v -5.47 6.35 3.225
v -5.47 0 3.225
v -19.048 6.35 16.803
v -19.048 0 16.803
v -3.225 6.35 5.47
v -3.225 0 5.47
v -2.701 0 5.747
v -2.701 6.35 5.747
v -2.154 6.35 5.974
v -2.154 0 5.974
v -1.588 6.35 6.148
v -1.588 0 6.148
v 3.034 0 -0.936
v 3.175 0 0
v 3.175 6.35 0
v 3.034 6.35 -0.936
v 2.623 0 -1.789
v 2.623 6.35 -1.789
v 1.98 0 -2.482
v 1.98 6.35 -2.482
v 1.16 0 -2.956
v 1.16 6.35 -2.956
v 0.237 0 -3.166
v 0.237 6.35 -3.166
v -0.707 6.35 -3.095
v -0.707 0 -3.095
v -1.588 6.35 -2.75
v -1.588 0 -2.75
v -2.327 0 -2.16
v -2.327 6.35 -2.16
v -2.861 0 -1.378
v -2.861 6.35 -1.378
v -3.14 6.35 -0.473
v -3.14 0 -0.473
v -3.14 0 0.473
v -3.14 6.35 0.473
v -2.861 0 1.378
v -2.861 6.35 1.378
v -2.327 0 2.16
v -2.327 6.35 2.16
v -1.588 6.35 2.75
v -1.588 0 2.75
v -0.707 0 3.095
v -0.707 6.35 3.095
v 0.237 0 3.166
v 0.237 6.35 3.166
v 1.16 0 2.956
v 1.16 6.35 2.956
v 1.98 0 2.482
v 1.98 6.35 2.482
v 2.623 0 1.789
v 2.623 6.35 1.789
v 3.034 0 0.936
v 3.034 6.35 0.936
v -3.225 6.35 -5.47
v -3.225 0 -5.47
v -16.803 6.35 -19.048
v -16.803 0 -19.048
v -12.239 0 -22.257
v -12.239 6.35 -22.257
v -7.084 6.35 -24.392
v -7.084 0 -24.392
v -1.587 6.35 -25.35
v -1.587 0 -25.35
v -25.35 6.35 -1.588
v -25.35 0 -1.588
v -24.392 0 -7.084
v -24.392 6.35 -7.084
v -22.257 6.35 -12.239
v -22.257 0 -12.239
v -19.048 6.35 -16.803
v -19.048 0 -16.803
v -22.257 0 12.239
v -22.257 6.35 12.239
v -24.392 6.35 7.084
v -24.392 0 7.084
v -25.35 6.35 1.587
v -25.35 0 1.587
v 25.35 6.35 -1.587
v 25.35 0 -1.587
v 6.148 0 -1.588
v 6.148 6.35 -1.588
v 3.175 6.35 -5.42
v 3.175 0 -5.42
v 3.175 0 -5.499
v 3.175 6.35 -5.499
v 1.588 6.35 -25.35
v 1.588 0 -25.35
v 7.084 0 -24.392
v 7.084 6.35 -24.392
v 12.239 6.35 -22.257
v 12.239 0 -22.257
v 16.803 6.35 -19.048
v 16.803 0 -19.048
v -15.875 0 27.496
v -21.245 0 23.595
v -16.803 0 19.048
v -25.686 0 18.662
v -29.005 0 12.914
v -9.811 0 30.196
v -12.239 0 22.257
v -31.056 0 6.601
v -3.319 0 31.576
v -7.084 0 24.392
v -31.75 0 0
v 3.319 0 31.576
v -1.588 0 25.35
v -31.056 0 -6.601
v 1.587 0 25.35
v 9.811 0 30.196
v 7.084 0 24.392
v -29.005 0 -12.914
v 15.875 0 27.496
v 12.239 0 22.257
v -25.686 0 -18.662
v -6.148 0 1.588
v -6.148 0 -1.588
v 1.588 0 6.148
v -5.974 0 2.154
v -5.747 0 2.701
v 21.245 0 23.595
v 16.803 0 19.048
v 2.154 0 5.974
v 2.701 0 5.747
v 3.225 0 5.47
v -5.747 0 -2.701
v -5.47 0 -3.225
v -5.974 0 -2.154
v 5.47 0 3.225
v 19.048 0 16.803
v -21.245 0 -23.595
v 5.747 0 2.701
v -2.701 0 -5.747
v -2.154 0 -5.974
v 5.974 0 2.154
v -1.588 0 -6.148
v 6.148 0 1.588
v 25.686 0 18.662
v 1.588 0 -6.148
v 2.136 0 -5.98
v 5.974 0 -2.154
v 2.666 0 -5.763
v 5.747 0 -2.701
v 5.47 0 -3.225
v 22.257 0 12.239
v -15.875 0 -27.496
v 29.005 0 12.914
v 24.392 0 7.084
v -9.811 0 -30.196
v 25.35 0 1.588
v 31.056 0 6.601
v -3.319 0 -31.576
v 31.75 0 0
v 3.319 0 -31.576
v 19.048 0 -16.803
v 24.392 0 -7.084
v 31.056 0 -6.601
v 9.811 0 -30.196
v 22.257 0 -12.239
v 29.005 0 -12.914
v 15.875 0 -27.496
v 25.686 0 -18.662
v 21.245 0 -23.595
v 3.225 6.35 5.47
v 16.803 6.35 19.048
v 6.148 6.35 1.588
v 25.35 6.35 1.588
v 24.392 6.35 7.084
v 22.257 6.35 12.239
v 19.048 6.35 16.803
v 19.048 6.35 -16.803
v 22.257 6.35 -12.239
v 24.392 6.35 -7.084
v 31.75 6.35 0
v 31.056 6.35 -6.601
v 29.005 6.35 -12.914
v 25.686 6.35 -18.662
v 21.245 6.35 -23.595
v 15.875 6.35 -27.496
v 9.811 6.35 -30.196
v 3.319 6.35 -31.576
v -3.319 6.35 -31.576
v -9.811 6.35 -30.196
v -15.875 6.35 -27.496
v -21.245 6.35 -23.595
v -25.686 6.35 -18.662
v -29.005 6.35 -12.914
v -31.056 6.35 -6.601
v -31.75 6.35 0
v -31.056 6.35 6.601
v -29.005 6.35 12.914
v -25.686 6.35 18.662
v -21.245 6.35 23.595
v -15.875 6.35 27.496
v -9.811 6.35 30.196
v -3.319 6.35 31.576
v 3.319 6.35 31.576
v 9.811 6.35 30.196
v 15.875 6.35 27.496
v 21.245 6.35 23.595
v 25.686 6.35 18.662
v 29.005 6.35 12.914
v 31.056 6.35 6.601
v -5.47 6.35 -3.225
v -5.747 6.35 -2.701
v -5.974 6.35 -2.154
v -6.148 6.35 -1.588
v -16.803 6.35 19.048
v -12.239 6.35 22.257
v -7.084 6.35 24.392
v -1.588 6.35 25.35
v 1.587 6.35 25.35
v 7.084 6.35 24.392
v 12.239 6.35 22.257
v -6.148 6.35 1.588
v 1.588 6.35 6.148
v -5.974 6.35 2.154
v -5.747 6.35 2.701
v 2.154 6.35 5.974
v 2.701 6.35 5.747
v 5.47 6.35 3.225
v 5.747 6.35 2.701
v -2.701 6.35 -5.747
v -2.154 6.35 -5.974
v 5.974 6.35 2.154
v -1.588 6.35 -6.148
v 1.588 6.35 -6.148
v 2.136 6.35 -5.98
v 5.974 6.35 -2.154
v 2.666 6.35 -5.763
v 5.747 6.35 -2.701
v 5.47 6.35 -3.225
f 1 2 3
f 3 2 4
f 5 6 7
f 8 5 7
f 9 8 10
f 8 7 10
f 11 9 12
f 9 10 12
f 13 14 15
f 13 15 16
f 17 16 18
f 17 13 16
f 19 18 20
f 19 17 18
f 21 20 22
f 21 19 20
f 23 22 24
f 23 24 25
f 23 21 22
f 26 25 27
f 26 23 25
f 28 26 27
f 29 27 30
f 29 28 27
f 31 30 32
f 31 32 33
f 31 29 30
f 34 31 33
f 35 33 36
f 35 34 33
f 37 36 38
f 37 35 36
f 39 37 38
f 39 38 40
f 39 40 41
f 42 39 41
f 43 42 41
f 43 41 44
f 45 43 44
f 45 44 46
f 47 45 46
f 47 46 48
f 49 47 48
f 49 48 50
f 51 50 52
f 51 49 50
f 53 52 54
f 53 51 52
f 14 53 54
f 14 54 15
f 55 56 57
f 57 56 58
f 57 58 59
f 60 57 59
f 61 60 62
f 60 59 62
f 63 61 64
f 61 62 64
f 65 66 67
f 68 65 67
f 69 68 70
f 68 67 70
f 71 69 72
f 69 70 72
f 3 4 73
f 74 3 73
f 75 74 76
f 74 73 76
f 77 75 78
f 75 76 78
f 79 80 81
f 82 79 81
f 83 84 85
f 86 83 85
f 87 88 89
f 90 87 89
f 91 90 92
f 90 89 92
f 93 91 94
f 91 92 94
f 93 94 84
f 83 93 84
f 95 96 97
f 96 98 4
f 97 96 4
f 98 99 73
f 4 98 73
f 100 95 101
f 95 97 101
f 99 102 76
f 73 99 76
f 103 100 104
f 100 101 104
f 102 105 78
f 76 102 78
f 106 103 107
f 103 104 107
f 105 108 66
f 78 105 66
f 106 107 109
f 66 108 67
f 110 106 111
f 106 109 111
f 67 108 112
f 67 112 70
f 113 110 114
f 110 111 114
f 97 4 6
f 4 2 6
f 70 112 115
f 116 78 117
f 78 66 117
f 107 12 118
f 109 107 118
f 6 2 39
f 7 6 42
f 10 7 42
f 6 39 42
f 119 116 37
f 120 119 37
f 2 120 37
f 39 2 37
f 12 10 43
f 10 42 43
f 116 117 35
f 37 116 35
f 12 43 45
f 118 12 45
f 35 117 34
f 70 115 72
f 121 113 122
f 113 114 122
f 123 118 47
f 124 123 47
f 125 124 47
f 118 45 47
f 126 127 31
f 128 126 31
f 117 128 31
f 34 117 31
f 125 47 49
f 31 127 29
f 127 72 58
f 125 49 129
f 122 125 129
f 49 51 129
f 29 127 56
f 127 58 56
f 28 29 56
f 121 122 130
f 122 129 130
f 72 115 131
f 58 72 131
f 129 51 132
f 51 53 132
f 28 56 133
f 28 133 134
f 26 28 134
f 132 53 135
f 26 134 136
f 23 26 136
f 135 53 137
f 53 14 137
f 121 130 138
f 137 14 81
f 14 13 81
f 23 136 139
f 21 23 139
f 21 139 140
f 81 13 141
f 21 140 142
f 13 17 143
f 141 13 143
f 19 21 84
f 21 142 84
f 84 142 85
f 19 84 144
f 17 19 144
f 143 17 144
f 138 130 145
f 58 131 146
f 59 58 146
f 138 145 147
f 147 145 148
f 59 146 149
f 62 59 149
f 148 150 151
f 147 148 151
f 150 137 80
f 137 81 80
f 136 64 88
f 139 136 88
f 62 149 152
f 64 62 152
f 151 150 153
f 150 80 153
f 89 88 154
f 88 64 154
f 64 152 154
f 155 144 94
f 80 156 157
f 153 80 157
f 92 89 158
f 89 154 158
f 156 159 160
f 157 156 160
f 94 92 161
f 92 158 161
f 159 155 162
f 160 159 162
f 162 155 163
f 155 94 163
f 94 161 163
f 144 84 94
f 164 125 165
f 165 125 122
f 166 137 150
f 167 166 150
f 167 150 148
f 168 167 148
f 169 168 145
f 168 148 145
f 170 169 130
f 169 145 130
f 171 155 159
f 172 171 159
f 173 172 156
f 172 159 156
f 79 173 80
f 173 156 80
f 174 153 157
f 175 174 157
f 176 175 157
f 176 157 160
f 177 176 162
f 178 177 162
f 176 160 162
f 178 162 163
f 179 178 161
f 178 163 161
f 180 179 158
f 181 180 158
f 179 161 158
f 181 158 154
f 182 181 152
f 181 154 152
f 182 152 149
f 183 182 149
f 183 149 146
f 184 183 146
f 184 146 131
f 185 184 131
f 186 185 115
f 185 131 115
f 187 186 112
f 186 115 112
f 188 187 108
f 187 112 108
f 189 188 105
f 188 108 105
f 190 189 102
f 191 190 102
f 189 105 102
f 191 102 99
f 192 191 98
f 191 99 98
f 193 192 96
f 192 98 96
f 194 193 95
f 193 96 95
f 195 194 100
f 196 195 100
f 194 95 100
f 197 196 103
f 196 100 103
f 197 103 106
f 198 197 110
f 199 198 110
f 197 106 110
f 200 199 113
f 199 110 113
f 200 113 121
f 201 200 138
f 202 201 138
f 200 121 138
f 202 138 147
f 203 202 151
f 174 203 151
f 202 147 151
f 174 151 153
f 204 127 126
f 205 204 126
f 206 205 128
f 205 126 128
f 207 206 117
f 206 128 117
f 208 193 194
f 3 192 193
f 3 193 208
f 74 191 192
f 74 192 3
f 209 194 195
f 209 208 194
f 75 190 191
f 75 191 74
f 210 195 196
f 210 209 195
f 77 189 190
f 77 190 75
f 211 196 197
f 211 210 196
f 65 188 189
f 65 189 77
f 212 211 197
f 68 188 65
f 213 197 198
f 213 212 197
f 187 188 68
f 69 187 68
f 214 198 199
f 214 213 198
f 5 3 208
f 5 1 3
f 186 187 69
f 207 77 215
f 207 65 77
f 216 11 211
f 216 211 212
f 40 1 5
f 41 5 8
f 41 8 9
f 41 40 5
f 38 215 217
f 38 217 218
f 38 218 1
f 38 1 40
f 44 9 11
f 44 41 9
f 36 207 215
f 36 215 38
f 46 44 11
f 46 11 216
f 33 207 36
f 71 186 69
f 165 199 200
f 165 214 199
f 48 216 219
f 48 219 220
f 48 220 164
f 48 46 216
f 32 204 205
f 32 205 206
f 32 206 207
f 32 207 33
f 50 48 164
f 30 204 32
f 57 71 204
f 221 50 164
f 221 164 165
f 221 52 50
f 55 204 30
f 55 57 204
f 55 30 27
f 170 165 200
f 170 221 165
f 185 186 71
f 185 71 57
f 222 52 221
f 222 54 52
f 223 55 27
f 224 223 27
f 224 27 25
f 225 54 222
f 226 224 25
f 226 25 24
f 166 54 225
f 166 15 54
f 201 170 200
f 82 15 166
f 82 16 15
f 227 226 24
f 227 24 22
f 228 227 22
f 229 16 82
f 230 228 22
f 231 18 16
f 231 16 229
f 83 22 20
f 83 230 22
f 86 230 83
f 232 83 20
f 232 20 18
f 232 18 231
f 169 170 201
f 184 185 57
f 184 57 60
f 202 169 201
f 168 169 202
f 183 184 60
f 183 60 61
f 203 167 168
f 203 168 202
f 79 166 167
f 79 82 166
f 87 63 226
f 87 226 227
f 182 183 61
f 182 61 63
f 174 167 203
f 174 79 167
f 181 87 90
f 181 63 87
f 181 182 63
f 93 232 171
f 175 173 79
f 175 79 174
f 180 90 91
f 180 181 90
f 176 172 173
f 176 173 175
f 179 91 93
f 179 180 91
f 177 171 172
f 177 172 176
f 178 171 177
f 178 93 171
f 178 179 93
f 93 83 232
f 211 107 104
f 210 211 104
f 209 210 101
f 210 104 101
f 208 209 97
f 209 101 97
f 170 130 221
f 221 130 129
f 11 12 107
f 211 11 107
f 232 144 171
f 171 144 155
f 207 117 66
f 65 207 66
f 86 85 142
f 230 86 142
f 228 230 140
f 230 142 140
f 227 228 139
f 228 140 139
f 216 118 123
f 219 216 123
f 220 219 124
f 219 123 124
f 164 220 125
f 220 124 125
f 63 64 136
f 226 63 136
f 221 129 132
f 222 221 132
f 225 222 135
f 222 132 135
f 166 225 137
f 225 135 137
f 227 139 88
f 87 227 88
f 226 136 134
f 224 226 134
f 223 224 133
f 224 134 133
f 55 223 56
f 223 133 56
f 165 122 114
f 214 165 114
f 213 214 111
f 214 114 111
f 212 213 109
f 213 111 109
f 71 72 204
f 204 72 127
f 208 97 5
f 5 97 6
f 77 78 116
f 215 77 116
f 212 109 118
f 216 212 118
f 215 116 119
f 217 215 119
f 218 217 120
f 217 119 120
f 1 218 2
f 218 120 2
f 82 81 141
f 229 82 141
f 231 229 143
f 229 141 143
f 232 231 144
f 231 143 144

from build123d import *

# Parameters (mm, degrees)
SKETCH1_R           = 31.75
SKETCH1_R_2         = 3.175
BOSS_EXTRUDE1_DEPTH = 6.35


with BuildPart() as part:
    # Sketch1 → Boss-Extrude1 (new body)
    with BuildSketch(Plane(origin=(0, 0, 0), x_dir=(1, 0, 0), z_dir=(0, 1, 0))):
        Circle(SKETCH1_R)
        with BuildLine():
            Line((-1.5875, -6.148361062), (-1.5875, -25.350342083))
            ThreePointArc((-1.5875, -25.350342083), (-9.720159182, -23.466540126), (-16.802866778, -19.047930808))
            Line((-16.802866778, -19.047930808), (-3.225015785, -5.470079815))
            ThreePointArc((-3.225015785, -5.470079815), (-2.430039796, -5.866635031), (-1.5875, -6.148361062))
        make_face(mode=Mode.SUBTRACT)
        with BuildLine():
            Line((-5.470079815, -3.225015785), (-19.047930808, -16.802866778))
            ThreePointArc((-19.047930808, -16.802866778), (-23.466540126, -9.720159182), (-25.350342083, -1.5875))
            Line((-25.350342083, -1.5875), (-6.148361062, -1.5875))
            ThreePointArc((-6.148361062, -1.5875), (-5.866635031, -2.430039796), (-5.470079815, -3.225015785))
        make_face(mode=Mode.SUBTRACT)
        with BuildLine():
            Line((3.225015785, -5.470079815), (16.802866778, -19.047930808))
            ThreePointArc((16.802866778, -19.047930808), (9.720159182, -23.466540126), (1.5875, -25.350342083))
            Line((1.5875, -25.350342083), (1.5875, -6.148361062))
            ThreePointArc((1.5875, -6.148361062), (2.430039796, -5.866635031), (3.225015785, -5.470079815))
        make_face(mode=Mode.SUBTRACT)
        with BuildLine():
            Line((6.148361062, -1.5875), (25.350342083, -1.5875))
            ThreePointArc((25.350342083, -1.5875), (23.466540126, -9.720159182), (19.047930808, -16.802866778))
            Line((19.047930808, -16.802866778), (5.470079815, -3.225015785))
            ThreePointArc((5.470079815, -3.225015785), (5.866635031, -2.430039796), (6.148361062, -1.5875))
        make_face(mode=Mode.SUBTRACT)
        with BuildLine():
            Line((-6.148361062, 1.5875), (-25.350342083, 1.5875))
            ThreePointArc((-25.350342083, 1.5875), (-23.466540126, 9.720159182), (-19.047930808, 16.802866778))
            Line((-19.047930808, 16.802866778), (-5.470079815, 3.225015785))
            ThreePointArc((-5.470079815, 3.225015785), (-5.866635031, 2.430039796), (-6.148361062, 1.5875))
        make_face(mode=Mode.SUBTRACT)
        with BuildLine():
            ThreePointArc((-16.802866778, 19.047930808), (-9.720159182, 23.466540126), (-1.5875, 25.350342083))
            Line((-1.5875, 25.350342083), (-1.5875, 6.148361062))
            ThreePointArc((-1.5875, 6.148361062), (-2.430039796, 5.866635031), (-3.225015785, 5.470079815))
            Line((-3.225015785, 5.470079815), (-16.802866778, 19.047930808))
        make_face(mode=Mode.SUBTRACT)
        Circle(SKETCH1_R_2, mode=Mode.SUBTRACT)
        with BuildLine():
            Line((5.470079815, 3.225015785), (19.047930808, 16.802866778))
            ThreePointArc((19.047930808, 16.802866778), (23.466540126, 9.720159182), (25.350342083, 1.5875))
            Line((25.350342083, 1.5875), (6.148361062, 1.5875))
            ThreePointArc((6.148361062, 1.5875), (5.866635031, 2.430039796), (5.470079815, 3.225015785))
        make_face(mode=Mode.SUBTRACT)
        with BuildLine():
            Line((3.225015785, 5.470079815), (3.175, 5.42006403))
            Line((3.175, 5.42006403), (3.175, 5.499261314))
            ThreePointArc((3.175, 5.499261314), (2.403265317, 5.877653938), (1.5875, 6.148361062))
            Line((1.5875, 6.148361062), (1.5875, 25.350342083))
            ThreePointArc((1.5875, 25.350342083), (9.720159182, 23.466540126), (16.802866778, 19.047930808))
            Line((16.802866778, 19.047930808), (3.225015785, 5.470079815))
        make_face(mode=Mode.SUBTRACT)
    extrude(amount=BOSS_EXTRUDE1_DEPTH)


solid = part.part
